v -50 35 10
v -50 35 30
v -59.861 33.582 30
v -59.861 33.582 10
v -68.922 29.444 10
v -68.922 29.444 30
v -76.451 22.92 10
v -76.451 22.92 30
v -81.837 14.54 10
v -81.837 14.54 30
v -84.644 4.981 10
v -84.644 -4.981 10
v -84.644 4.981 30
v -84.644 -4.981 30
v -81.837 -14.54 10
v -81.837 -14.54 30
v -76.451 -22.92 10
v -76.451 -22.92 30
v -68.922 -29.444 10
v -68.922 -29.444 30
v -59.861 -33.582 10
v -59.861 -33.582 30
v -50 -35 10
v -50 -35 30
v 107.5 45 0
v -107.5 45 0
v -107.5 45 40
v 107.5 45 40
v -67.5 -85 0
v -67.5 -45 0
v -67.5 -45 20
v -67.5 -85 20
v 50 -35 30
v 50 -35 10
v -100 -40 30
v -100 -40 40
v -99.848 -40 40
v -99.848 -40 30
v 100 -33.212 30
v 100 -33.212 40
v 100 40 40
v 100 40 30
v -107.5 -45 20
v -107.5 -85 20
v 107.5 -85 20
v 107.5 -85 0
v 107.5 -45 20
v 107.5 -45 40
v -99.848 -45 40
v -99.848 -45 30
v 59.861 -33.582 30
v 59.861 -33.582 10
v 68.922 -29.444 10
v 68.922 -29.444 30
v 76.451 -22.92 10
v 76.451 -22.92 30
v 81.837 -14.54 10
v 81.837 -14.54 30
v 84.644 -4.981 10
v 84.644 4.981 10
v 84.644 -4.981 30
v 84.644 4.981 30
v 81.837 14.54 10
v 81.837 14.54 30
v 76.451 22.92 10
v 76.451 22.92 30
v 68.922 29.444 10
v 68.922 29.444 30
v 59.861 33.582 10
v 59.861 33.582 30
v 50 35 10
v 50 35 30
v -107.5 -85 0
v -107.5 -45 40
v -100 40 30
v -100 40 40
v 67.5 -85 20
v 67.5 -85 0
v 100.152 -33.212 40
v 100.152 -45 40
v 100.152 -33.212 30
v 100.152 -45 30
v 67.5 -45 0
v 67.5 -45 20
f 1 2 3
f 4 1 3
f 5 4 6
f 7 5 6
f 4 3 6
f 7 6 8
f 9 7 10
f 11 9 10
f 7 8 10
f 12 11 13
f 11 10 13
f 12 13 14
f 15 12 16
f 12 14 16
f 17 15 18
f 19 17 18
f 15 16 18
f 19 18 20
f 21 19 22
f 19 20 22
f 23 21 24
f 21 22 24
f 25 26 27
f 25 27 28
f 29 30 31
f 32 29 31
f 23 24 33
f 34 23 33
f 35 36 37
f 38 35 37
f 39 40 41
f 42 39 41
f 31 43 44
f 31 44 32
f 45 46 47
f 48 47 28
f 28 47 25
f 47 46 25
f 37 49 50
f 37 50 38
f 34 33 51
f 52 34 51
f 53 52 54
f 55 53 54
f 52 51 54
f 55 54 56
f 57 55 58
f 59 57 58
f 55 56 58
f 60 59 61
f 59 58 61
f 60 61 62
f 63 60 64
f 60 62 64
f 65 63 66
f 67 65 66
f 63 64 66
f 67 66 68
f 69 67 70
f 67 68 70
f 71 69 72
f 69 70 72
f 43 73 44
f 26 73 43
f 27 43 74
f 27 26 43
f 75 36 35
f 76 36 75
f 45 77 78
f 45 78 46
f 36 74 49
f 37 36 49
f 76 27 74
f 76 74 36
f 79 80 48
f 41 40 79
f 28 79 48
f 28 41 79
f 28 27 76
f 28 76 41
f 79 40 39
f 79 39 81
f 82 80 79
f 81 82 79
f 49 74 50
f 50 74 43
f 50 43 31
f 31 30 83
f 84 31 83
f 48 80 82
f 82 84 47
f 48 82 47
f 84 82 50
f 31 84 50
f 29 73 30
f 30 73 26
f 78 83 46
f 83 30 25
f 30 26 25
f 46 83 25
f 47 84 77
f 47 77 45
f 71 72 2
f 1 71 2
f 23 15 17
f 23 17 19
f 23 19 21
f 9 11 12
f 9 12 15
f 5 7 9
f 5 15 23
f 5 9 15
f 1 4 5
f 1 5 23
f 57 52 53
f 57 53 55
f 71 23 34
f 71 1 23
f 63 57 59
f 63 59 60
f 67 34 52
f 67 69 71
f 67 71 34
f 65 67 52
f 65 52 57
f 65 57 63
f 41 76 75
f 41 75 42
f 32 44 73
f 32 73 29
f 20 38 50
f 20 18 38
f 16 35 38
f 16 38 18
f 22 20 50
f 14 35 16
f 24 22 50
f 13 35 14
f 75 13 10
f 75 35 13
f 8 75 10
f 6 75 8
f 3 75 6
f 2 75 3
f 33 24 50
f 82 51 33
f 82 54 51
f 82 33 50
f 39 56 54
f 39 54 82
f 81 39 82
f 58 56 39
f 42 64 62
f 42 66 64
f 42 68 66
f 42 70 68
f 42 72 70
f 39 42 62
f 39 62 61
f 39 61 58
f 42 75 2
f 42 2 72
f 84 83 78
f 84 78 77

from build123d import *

# Parameters (mm, degrees)
SKETCH_W        = 215
SKETCH_H        = 90
PAD_DEPTH       = 40
SKETCH001_W     = 200
SKETCH001_H     = 80
POCKET_DEPTH    = 10
SKETCH002_W     = 200
SKETCH002_H     = 13.845135
POCKET001_DEPTH = 10
POCKET002_DEPTH = 20
SKETCH004_W     = 40
SKETCH004_H     = 20
PAD001_DEPTH    = 40


with BuildPart() as part:
    # Sketch → Pad (new body)
    with BuildSketch(Plane.XY):
        Rectangle(SKETCH_W, SKETCH_H)
    extrude(amount=PAD_DEPTH)

    # Sketch001 (on Face6 of Pad) → Pocket (cut)
    with BuildSketch(Plane.XY.offset(40)):
        Rectangle(SKETCH001_W, SKETCH001_H)
    extrude(amount=-POCKET_DEPTH, mode=Mode.SUBTRACT)

    # Sketch002 (on Face5 of Pocket) → Pocket001 (cut)
    with BuildSketch(Plane.XY.offset(40)):
        with Locations((0.151818, -40.134584)):
            Rectangle(SKETCH002_W, SKETCH002_H)
    extrude(amount=-POCKET001_DEPTH, mode=Mode.SUBTRACT)

    # Sketch003 (on Face14 of Pocket001) → Pocket002 (cut)
    with BuildSketch(Plane.XY.offset(30)):
        with BuildLine():
            ThreePointArc((-50, 35), (-85, 0), (-50, -35))
            Line((-50, -35), (50, -35))
            ThreePointArc((50, -35), (85, 0), (50, 35))
            Line((50, 35), (-50, 35))
        make_face()
    extrude(amount=-POCKET002_DEPTH, mode=Mode.SUBTRACT)

    # Sketch004 (on Face6 of Pocket002) → Pad001 (join)
    with BuildSketch(Plane.XZ.offset(45)):
        with Locations((-87.5, 10)):
            Rectangle(SKETCH004_W, SKETCH004_H)
        with Locations((87.5, 10)):
            Rectangle(SKETCH004_W, SKETCH004_H)
    extrude(amount=PAD001_DEPTH)


solid = part.part
